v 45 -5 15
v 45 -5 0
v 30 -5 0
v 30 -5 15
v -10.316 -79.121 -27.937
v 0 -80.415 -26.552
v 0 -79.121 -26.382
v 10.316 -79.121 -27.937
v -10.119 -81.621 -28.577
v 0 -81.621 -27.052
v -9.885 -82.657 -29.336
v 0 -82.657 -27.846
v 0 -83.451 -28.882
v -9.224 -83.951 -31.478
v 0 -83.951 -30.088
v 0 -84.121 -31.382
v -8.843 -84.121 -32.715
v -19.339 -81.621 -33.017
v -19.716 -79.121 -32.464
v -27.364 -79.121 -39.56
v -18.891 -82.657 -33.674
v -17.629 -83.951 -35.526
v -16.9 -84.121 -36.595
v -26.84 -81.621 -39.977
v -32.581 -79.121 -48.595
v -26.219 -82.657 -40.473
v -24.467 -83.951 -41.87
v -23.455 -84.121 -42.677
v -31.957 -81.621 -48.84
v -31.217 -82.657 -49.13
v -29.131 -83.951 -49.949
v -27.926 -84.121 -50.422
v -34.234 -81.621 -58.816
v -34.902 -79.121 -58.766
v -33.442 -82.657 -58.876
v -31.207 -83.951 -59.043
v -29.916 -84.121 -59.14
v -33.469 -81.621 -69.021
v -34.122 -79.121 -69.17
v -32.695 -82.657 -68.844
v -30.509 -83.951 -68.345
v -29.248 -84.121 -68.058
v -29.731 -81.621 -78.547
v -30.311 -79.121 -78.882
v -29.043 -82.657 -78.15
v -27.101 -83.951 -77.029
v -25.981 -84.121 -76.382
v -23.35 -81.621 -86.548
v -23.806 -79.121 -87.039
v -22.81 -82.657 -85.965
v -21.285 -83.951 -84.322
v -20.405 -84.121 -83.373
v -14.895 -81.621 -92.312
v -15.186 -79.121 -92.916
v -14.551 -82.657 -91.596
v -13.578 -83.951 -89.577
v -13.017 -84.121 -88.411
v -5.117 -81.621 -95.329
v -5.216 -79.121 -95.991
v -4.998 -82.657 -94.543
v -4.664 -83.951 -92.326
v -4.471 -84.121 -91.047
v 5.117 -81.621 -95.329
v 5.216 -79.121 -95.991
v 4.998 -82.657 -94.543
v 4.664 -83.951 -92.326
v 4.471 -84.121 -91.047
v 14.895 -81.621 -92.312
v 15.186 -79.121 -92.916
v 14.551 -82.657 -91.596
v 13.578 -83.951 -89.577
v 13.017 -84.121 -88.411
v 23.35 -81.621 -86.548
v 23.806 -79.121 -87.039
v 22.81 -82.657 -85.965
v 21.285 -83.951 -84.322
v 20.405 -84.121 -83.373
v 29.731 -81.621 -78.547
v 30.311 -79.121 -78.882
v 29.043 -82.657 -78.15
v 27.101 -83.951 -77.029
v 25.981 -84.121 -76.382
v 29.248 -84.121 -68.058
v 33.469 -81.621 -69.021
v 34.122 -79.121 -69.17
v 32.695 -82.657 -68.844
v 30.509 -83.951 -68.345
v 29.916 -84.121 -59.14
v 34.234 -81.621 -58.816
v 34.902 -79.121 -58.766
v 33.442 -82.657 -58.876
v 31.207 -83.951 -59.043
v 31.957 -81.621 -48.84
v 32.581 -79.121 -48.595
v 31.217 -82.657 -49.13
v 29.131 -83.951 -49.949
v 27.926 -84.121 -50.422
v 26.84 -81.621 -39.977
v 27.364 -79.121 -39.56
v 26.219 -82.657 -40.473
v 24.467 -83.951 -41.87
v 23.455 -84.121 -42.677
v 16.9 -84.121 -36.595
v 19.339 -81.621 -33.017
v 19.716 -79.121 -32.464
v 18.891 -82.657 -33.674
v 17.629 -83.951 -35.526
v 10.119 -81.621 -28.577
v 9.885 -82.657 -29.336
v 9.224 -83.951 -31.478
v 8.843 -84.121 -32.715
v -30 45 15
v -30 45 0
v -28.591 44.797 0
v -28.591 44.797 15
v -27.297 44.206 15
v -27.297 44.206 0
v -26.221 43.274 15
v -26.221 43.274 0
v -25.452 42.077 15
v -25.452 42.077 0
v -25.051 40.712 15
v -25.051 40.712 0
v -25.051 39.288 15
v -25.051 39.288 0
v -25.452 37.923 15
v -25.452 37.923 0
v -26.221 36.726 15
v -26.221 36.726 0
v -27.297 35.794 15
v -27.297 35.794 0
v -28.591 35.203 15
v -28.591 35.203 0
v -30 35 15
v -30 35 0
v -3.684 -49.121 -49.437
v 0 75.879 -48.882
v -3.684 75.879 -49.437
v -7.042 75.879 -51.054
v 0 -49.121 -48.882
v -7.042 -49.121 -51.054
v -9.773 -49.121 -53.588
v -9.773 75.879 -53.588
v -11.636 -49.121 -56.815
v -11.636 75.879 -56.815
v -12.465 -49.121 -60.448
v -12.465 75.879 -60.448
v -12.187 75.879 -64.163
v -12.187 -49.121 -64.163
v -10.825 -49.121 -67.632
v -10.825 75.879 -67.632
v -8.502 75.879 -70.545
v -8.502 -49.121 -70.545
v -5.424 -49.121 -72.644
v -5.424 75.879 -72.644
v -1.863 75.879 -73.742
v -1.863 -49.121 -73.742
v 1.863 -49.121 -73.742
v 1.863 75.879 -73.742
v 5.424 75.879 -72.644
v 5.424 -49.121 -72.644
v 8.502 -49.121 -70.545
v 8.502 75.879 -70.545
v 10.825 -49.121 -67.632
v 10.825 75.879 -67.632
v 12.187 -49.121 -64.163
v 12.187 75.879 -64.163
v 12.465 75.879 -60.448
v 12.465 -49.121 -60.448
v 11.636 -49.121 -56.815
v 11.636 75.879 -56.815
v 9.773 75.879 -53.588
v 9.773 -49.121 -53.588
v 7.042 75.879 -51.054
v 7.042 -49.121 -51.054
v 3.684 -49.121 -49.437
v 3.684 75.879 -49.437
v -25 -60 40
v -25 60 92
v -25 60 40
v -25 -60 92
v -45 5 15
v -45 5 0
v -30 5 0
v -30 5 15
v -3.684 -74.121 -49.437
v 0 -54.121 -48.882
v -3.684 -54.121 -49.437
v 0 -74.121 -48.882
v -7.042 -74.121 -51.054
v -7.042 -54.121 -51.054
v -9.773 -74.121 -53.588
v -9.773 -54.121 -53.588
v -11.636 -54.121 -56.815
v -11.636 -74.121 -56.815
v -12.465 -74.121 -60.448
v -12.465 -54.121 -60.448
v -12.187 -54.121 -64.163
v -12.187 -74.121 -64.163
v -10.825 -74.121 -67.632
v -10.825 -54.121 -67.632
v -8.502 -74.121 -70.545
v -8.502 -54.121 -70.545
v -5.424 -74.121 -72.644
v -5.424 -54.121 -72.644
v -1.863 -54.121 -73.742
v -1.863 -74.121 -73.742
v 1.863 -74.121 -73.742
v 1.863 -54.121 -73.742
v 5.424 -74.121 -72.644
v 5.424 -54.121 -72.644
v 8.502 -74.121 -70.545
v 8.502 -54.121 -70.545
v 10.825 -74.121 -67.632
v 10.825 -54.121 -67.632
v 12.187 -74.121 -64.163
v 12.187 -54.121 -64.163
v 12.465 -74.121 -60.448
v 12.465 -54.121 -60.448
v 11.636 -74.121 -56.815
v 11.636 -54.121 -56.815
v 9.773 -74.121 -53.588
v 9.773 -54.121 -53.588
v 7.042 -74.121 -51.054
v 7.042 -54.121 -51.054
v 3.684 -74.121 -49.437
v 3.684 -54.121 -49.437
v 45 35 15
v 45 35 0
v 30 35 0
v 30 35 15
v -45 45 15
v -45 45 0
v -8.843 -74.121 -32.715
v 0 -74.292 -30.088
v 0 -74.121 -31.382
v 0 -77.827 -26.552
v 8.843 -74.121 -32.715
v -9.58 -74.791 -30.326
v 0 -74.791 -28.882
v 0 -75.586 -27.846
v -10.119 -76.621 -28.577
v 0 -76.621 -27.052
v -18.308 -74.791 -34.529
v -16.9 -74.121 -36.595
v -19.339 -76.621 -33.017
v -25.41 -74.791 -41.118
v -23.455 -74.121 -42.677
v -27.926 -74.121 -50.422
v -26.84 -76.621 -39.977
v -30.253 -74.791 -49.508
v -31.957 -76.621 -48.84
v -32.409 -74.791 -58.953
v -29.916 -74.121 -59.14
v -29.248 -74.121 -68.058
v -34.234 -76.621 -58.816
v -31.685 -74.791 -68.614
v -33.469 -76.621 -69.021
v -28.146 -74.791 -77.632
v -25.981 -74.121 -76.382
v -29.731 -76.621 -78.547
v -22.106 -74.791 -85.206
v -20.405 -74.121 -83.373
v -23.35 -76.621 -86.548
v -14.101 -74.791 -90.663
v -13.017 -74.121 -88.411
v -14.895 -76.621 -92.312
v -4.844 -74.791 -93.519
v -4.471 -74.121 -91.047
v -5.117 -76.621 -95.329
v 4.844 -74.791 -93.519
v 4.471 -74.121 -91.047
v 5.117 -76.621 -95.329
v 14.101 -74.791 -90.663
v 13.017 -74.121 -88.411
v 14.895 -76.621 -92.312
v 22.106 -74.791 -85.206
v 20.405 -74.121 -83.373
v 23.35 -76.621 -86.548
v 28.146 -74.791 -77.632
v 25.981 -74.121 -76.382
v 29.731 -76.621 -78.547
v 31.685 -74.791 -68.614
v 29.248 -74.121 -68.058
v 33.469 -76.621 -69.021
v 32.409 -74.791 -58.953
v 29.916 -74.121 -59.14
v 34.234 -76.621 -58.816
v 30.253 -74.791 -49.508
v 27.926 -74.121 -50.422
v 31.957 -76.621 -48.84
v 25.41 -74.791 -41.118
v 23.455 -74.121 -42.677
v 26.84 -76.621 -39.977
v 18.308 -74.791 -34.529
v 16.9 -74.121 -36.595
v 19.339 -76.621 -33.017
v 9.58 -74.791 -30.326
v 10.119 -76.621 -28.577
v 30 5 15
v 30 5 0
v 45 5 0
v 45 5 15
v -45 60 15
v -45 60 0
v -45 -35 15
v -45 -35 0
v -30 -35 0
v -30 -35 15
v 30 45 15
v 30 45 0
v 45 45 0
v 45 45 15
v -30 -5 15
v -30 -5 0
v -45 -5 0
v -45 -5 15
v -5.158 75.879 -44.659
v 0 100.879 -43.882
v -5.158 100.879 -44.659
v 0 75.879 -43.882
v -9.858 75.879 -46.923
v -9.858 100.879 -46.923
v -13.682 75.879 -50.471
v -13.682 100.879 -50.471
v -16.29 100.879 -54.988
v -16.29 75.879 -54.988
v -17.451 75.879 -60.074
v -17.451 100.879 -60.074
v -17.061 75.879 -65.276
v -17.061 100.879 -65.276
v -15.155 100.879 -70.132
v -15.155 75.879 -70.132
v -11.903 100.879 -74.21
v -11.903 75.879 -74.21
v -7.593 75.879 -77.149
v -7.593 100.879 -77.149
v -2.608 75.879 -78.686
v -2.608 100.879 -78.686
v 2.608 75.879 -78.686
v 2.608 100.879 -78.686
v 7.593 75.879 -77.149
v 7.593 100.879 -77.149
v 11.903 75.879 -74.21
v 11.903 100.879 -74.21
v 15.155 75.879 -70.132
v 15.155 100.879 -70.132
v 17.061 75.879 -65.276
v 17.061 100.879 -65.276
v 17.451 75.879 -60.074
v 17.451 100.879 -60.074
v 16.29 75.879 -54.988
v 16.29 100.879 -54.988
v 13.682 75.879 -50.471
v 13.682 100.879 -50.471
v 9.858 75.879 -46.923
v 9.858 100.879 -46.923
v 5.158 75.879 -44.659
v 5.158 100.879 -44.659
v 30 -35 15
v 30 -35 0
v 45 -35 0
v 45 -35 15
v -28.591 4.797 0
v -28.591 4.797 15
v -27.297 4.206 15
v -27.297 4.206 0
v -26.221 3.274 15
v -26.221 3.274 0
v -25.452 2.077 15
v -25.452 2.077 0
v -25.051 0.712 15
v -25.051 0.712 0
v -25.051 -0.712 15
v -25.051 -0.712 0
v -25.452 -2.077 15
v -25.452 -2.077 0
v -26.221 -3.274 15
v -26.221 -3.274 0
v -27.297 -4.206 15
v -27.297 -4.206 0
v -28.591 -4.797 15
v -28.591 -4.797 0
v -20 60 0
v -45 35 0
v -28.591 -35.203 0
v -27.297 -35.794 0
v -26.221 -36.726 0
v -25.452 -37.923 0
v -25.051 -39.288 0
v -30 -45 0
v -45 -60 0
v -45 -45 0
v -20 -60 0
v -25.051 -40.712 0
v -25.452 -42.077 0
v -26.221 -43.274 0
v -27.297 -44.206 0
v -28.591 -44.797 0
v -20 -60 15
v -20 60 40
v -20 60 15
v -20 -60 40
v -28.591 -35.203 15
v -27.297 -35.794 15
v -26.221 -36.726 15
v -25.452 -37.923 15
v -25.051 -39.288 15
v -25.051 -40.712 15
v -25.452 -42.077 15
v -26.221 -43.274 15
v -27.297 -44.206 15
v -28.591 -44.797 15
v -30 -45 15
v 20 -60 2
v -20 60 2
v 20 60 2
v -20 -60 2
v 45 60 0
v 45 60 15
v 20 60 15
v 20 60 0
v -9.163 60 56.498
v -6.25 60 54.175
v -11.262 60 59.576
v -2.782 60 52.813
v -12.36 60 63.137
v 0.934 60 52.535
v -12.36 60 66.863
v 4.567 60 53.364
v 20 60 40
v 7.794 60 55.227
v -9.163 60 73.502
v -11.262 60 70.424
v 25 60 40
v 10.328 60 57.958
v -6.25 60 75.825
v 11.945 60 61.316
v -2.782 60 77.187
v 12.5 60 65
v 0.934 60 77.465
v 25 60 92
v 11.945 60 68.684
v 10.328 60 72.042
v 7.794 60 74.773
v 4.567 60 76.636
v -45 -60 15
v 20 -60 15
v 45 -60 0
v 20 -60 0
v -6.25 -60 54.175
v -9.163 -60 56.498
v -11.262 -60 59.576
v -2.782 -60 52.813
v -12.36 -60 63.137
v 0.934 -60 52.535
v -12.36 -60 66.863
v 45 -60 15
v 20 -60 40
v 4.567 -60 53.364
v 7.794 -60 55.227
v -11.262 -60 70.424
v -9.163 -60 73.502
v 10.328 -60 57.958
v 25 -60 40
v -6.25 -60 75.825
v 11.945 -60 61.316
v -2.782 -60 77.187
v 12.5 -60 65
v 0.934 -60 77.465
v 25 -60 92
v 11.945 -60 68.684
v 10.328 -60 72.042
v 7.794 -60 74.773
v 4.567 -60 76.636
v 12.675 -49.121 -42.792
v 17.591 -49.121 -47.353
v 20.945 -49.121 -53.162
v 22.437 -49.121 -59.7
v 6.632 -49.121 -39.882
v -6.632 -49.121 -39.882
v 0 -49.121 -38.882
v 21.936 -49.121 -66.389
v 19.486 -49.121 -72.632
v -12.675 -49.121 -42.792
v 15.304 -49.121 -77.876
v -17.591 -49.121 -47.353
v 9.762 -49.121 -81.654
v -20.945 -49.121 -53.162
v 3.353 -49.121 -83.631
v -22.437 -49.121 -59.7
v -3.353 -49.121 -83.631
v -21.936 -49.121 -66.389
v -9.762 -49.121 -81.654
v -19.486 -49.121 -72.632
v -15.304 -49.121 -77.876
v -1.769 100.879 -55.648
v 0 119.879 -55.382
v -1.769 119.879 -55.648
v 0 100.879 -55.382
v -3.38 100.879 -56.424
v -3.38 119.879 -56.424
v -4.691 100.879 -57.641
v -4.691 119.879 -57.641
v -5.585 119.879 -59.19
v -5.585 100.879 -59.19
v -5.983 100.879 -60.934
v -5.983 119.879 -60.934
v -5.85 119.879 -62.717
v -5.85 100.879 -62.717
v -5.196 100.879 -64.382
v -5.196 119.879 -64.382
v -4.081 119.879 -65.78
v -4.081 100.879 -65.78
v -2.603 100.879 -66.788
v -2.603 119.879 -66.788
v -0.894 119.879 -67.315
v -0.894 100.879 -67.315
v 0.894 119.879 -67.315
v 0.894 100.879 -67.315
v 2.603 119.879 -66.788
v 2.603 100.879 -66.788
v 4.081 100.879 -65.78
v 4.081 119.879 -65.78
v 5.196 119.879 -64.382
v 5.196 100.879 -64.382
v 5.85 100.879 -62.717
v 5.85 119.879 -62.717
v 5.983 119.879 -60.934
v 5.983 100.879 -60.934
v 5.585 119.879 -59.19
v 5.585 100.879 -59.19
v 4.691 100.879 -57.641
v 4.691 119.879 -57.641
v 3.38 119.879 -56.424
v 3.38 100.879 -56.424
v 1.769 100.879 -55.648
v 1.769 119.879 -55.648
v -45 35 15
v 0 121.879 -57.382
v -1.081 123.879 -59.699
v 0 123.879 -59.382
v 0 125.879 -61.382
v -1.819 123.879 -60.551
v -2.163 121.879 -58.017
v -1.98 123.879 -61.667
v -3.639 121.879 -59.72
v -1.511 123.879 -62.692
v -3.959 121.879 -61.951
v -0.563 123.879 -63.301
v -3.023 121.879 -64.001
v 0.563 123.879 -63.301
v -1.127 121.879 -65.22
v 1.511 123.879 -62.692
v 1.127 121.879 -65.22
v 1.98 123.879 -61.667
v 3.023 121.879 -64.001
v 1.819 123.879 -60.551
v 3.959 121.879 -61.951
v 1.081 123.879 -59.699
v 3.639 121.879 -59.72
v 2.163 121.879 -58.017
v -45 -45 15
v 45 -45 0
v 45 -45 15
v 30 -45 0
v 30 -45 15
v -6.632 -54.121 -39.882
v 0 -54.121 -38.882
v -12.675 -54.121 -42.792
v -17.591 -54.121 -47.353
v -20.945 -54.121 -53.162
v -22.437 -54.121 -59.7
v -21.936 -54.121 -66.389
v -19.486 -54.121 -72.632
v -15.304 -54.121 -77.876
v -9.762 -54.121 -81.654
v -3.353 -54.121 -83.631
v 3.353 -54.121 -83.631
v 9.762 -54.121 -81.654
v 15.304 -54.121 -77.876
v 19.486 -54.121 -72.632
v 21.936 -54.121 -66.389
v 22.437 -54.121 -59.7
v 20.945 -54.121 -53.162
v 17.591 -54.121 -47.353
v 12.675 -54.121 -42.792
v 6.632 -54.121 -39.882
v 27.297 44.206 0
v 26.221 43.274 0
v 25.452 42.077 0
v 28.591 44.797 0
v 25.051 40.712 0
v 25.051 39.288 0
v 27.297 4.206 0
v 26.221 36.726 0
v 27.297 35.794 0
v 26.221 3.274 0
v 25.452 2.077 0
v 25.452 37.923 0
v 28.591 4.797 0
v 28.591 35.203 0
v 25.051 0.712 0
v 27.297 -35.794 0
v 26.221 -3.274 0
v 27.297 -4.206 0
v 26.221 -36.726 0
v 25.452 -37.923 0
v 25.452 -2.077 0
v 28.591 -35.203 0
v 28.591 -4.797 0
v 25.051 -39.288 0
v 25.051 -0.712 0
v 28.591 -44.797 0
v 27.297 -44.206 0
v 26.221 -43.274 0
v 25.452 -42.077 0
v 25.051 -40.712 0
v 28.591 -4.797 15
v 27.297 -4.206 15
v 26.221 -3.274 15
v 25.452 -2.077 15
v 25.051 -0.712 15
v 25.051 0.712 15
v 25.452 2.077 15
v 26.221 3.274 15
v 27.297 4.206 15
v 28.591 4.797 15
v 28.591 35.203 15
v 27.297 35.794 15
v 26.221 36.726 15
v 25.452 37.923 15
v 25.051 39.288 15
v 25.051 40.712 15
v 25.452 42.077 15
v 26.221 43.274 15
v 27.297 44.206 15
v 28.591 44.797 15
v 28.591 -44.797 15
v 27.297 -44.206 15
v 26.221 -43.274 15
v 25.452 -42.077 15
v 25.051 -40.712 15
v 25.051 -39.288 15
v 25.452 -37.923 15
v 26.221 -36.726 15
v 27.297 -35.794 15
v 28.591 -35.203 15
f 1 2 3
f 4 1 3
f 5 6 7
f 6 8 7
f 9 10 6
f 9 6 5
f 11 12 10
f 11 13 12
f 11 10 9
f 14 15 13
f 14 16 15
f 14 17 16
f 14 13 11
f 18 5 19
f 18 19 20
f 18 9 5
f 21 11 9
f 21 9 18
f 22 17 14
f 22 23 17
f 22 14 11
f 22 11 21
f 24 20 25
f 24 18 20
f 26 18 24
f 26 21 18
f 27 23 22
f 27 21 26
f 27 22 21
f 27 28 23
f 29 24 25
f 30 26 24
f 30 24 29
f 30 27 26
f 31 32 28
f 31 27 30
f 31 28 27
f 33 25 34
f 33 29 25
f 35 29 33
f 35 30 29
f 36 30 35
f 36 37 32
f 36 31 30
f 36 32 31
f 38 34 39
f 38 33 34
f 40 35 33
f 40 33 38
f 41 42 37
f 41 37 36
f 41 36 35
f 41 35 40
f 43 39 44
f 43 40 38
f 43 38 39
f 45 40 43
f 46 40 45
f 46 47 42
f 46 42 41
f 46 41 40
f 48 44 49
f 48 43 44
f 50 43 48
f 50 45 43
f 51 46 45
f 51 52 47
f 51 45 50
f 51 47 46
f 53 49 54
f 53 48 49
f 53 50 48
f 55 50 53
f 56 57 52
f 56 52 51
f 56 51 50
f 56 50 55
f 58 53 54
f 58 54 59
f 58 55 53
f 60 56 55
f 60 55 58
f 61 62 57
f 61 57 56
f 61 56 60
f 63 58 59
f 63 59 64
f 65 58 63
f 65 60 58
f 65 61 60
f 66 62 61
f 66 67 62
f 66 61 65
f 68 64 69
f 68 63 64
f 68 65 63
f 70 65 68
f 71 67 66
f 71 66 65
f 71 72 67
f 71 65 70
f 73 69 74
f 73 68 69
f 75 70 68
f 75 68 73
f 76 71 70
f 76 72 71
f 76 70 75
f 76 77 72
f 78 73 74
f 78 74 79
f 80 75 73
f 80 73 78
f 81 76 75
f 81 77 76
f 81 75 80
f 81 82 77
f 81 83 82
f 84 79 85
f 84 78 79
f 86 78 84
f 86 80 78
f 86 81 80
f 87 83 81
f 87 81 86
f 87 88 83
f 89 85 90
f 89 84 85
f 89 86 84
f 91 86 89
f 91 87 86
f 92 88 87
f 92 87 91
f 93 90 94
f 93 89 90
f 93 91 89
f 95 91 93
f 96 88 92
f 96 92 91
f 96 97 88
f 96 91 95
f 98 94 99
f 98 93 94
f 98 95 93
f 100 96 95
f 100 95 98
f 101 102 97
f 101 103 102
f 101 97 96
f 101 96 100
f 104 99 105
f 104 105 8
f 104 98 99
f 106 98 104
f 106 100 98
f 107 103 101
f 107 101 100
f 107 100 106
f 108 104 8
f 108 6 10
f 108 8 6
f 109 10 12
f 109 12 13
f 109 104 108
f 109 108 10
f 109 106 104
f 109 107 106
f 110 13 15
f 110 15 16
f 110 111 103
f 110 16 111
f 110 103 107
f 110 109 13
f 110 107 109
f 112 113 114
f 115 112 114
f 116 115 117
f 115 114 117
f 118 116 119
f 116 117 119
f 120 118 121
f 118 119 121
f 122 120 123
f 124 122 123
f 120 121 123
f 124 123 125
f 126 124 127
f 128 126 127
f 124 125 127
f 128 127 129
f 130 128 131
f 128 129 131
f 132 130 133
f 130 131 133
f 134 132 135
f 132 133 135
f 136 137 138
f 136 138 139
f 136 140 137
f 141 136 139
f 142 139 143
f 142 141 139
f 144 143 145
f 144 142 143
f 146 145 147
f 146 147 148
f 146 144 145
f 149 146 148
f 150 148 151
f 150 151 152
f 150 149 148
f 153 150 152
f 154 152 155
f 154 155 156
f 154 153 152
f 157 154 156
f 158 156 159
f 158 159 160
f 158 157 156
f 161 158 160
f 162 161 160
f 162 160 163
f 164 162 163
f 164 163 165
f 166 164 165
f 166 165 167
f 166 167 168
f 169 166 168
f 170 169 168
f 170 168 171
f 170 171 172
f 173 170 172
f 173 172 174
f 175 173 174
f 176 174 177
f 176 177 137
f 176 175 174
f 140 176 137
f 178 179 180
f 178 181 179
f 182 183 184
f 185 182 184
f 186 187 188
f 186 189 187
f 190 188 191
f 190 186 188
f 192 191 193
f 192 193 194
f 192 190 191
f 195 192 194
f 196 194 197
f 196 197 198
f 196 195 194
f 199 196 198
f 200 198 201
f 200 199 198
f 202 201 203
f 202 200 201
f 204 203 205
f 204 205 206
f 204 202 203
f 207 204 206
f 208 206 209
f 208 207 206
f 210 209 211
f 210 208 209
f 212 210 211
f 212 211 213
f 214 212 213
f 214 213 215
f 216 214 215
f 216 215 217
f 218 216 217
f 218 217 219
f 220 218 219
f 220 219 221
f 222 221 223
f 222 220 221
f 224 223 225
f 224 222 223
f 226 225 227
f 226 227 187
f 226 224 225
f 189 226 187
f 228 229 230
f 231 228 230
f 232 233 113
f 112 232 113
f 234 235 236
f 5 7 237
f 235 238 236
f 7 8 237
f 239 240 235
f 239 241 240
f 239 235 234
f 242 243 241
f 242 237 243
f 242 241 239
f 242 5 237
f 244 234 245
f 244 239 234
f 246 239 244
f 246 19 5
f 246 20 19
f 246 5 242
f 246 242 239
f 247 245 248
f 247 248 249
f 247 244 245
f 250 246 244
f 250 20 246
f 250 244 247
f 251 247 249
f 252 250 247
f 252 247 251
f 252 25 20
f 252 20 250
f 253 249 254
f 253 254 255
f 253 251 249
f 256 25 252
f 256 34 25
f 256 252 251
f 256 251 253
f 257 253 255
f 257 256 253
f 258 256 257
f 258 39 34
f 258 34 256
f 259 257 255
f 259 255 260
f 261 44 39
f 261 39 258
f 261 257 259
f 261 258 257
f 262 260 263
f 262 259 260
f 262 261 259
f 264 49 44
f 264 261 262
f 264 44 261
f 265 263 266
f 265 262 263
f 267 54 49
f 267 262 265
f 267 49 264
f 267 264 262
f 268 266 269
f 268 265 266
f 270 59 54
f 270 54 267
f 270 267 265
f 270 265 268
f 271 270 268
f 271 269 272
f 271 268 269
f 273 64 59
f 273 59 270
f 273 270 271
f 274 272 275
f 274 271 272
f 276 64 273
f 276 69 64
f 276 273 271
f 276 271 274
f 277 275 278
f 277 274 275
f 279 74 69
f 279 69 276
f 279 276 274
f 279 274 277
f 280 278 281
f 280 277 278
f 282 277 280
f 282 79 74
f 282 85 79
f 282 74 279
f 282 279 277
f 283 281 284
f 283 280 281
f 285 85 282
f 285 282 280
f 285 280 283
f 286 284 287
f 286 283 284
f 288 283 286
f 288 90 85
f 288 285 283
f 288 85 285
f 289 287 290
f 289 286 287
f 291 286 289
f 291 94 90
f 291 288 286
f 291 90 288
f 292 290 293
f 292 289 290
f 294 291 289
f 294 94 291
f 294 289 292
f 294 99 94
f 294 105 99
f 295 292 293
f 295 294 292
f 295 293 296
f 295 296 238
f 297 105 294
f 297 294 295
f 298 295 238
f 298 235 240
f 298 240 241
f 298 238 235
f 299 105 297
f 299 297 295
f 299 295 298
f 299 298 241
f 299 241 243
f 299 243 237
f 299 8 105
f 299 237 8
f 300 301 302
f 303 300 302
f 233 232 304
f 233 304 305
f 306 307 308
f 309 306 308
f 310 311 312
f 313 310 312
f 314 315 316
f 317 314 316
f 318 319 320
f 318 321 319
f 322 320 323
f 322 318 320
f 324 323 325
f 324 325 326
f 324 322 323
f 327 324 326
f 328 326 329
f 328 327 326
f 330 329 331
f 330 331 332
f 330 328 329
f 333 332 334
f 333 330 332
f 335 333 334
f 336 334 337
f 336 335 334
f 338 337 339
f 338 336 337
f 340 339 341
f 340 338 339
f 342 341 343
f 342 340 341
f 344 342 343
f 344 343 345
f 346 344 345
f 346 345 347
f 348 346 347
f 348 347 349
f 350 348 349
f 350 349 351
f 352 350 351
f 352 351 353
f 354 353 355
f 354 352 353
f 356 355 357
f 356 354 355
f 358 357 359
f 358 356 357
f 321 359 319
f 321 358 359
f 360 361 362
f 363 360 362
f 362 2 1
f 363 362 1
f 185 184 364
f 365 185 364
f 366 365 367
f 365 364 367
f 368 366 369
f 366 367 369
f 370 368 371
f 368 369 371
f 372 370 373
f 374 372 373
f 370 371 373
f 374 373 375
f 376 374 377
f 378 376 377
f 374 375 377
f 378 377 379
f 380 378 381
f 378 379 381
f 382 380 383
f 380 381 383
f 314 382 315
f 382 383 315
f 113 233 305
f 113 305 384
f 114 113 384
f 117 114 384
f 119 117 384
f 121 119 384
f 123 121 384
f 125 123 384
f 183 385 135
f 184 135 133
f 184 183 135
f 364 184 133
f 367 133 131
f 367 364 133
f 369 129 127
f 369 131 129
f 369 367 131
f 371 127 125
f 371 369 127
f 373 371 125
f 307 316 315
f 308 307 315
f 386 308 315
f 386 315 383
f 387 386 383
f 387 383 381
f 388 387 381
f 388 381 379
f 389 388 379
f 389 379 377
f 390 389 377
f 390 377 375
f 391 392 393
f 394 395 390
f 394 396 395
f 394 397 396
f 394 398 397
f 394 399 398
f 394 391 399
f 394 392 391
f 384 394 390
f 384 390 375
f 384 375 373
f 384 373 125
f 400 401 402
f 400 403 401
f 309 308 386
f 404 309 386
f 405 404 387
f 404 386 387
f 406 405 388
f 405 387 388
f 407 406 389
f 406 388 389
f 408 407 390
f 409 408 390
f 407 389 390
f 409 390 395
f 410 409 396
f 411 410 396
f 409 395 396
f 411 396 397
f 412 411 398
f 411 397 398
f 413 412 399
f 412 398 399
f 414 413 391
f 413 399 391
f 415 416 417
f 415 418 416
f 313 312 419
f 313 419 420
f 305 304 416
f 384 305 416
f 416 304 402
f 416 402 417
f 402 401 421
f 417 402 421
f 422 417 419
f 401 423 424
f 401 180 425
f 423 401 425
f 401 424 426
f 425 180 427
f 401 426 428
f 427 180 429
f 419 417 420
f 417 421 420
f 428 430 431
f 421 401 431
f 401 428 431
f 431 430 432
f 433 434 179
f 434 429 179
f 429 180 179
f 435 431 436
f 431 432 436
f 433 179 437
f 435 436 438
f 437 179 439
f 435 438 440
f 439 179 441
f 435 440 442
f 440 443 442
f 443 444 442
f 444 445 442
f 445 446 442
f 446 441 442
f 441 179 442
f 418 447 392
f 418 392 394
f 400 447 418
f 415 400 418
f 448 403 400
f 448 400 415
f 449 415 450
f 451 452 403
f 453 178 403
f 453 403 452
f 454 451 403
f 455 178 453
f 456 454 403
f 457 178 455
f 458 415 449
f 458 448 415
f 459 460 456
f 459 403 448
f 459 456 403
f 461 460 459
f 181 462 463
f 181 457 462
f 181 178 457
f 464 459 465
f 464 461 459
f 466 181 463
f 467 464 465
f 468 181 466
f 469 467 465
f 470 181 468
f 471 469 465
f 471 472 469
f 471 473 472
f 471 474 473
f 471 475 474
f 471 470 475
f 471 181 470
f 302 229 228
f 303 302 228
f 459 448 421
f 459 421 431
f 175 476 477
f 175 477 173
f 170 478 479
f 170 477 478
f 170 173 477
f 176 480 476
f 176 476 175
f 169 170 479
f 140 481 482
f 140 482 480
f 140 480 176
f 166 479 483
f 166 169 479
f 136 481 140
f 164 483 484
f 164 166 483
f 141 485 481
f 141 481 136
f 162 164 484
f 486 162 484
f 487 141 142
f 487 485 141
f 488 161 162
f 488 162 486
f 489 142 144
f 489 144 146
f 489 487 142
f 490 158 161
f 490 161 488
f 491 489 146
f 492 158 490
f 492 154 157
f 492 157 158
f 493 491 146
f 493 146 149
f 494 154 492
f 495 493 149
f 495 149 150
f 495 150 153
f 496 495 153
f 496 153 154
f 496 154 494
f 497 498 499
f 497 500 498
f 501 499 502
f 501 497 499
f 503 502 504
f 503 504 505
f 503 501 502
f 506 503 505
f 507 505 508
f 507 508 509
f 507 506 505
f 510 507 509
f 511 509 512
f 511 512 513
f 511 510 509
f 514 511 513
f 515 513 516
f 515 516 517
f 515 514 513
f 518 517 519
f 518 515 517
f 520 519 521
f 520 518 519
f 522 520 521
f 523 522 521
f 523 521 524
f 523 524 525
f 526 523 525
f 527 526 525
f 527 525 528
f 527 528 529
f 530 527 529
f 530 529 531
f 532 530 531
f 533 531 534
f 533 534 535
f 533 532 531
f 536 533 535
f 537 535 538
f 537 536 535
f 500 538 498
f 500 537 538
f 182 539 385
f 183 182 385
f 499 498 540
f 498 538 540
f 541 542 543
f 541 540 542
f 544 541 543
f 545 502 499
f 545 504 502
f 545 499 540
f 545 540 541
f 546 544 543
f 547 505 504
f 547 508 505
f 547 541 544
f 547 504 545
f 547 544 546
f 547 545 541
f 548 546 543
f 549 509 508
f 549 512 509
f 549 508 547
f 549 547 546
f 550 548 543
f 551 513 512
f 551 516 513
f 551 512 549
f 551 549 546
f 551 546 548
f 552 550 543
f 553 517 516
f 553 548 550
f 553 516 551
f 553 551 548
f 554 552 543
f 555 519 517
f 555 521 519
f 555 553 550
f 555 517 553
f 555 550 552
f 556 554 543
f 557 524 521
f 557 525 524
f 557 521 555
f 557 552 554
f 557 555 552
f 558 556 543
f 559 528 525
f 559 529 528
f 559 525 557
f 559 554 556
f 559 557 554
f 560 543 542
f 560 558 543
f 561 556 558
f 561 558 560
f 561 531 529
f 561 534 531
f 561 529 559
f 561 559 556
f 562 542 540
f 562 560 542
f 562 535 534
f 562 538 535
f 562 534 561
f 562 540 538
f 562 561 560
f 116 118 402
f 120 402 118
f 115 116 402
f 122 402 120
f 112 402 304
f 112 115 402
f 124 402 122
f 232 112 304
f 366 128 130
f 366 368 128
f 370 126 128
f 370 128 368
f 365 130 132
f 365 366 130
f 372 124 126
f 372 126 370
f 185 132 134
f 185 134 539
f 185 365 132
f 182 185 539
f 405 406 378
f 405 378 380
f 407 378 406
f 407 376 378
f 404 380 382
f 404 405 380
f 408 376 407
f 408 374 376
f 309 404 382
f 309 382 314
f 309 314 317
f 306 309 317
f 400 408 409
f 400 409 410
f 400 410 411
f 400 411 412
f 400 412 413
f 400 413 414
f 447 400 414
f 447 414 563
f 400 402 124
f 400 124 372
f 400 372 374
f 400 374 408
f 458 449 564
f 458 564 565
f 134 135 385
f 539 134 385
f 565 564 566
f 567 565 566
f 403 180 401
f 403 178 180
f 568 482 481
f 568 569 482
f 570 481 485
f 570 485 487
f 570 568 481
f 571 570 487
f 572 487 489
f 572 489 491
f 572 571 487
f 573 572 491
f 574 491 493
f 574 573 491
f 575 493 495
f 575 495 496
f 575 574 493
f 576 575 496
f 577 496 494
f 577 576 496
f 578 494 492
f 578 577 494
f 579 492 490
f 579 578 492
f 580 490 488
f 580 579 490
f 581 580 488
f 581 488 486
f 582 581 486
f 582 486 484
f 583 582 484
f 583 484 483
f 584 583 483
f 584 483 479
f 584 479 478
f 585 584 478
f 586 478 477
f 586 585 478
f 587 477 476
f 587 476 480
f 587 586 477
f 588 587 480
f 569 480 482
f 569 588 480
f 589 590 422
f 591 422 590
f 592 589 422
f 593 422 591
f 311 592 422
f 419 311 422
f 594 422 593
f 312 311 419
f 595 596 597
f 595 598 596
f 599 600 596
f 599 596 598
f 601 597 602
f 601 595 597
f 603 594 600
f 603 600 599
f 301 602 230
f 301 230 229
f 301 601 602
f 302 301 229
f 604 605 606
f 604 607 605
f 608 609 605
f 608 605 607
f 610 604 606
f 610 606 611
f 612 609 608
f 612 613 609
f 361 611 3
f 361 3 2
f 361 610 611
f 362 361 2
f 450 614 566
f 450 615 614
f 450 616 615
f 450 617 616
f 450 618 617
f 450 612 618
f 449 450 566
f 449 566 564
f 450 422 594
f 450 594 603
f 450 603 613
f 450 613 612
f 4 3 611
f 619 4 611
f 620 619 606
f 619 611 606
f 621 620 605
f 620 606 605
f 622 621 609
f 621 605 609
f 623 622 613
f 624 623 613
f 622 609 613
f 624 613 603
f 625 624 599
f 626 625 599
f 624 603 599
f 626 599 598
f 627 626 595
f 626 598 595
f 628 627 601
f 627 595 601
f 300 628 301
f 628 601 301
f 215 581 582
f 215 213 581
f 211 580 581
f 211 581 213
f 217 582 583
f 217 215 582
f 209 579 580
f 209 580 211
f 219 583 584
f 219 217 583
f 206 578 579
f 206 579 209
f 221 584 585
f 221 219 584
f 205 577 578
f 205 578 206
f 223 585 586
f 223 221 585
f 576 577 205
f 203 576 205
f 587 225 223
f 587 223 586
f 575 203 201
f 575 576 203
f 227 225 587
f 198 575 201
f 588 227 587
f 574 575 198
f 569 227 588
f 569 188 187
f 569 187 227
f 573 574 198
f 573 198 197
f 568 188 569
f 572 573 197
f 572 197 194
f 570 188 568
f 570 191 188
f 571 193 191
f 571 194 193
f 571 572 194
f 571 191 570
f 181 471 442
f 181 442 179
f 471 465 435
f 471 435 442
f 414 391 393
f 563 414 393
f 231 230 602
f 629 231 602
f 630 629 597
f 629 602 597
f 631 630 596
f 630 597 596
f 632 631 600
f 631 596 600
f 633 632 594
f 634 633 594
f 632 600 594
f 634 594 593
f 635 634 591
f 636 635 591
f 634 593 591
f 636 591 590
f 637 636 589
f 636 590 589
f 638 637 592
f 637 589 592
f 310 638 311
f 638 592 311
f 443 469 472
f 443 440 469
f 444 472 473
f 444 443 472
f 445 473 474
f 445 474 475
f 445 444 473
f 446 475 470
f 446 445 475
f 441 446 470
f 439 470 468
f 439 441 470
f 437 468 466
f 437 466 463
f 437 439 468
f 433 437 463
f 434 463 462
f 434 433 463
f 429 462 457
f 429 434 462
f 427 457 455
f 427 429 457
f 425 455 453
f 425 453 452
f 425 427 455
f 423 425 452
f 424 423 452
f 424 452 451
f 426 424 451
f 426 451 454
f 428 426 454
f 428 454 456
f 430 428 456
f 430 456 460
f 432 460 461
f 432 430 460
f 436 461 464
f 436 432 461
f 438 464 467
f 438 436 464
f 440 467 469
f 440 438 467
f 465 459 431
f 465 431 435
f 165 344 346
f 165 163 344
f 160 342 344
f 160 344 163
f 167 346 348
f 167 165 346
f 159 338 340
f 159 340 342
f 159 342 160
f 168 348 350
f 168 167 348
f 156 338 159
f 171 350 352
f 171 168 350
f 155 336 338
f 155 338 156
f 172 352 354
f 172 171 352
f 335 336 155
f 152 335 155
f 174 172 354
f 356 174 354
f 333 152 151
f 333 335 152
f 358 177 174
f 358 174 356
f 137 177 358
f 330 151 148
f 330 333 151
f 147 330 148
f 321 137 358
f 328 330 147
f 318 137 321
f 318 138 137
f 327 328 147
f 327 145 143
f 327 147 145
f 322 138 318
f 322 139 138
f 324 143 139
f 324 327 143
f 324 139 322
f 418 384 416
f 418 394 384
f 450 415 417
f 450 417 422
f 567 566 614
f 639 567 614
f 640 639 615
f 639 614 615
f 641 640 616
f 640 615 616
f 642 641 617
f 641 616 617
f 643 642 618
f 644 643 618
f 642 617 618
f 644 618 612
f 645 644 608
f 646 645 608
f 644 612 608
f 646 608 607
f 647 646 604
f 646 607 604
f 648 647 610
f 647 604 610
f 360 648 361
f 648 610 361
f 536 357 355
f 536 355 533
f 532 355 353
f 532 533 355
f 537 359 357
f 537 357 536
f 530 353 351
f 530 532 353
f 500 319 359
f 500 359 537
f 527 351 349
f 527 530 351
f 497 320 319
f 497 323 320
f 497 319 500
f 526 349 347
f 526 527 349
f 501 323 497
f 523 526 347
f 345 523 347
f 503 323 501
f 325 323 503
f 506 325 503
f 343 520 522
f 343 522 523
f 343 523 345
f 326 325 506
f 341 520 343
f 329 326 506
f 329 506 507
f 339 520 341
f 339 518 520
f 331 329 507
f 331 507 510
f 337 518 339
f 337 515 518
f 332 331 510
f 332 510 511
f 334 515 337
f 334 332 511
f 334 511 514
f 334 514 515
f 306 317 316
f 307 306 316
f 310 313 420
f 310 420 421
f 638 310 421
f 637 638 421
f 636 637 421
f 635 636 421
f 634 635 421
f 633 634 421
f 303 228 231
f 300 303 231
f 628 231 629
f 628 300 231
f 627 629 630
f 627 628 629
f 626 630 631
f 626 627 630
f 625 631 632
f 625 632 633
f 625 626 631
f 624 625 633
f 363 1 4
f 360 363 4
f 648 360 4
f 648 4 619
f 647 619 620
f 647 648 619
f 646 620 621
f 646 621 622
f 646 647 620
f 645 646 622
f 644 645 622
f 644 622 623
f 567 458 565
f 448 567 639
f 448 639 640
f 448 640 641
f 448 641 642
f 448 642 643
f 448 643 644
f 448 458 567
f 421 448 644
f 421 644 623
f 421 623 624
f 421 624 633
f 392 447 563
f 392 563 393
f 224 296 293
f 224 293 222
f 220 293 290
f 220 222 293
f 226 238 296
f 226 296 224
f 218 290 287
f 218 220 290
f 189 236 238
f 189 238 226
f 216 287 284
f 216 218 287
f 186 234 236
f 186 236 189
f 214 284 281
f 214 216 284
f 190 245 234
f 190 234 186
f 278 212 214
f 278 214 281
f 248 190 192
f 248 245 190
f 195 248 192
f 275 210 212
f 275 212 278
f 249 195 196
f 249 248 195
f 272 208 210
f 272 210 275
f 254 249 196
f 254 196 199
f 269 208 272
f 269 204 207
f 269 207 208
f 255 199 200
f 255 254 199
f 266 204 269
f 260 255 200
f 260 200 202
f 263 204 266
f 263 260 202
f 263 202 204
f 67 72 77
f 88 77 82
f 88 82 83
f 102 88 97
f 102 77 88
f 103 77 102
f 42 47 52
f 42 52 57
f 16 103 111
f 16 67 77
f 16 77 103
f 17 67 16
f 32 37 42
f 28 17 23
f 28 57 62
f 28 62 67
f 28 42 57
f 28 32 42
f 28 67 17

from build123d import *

# Parameters (mm, degrees)
F0_R     = 12.5
F1_DEPTH = 60
F3_DEPTH = 25
F6_R     = 4.99999


# Not quite as in the source:
# - a fillet or chamfer is up to 0.001 mm smaller than in the source, because OpenCascade refuses the exact size


with BuildPart() as f1:
    # F0 (on Front) → F1 (new body, symmetric)
    with BuildSketch(Plane.XZ):
        Polygon((-20, 2), (0, 2), (20, 2), (20, 0), (45, 0), (45, 15), (20, 15), (20, 40), (25, 40), (25, 92), (-25, 92), (-25, 40), (-20, 40), (-20, 15), (-45, 15), (-45, 0), (-20, 0), align=None)
        with Locations((0, 65)):
            Circle(F0_R, mode=Mode.SUBTRACT)
    extrude(amount=F1_DEPTH, both=True)

    # F2 (on face) → F3 (cut)
    with BuildSketch(Plane(origin=(0, 0, 0), x_dir=(1, 0, 0), z_dir=(0, 0, -1))):
        with BuildLine():
            ThreePointArc((-30, 35), (-25, 40), (-30, 45))
            Line((-30, 45), (-50, 45))
            ThreePointArc((-50, 45), (-55, 40), (-50, 35))
            Line((-50, 35), (-30, 35))
        make_face()
        with BuildLine():
            ThreePointArc((-30, -5), (-25, 0), (-30, 5))
            Line((-30, 5), (-50, 5))
            ThreePointArc((-50, 5), (-55, 0), (-50, -5))
            Line((-50, -5), (-30, -5))
        make_face()
        with BuildLine():
            ThreePointArc((-30, -45), (-25, -40), (-30, -35))
            Line((-30, -35), (-50, -35))
            ThreePointArc((-50, -35), (-55, -40), (-50, -45))
            Line((-50, -45), (-30, -45))
        make_face()
        with BuildLine():
            Line((50, 45), (30, 45))
            ThreePointArc((30, 45), (25, 40), (30, 35))
            Line((30, 35), (50, 35))
            ThreePointArc((50, 35), (55, 40), (50, 45))
        make_face()
        with BuildLine():
            Line((50, 5), (30, 5))
            ThreePointArc((30, 5), (25, 0), (30, -5))
            Line((30, -5), (50, -5))
            ThreePointArc((50, -5), (55, 0), (50, 5))
        make_face()
        with BuildLine():
            Line((50, -35), (30, -35))
            ThreePointArc((30, -35), (25, -40), (30, -45))
            Line((30, -45), (50, -45))
            ThreePointArc((50, -45), (55, -40), (50, -35))
        make_face()
    extrude(amount=-F3_DEPTH, mode=Mode.SUBTRACT)


with BuildPart() as f5:
    # F4 (on Right) → F5 (revolve)
    with BuildSketch(Plane.YZ):
        Polygon((-84.121281445, -61.381906271), (125.878718555, -61.381906271), (119.878718555, -55.381906271), (100.878718555, -55.381906271), (100.878718555, -43.881906271), (75.878718555, -43.881906271), (75.878718555, -48.881906271), (-49.121281445, -48.881906271), (-49.121281445, -38.881906271), (-54.121281445, -38.881906271), (-54.121281445, -48.881906271), (-74.121281445, -48.881906271), (-74.121281445, -26.381906271), (-84.121281445, -26.381906271), align=None)
    revolve(axis=Axis((0, 20.878718555, -61.381906271), (0, -1, 0)))

    # F6 (radius 5 in the source; OpenCascade refuses exactly that, so slightly less here)
    f6_edges = [f5.edges().sort_by_distance(p)[0] for p in [
        (0, -74.121281, -96.381906),
        (0, -84.121281, -96.381906),
    ]]
    fillet(f6_edges, radius=F6_R)


solid = Compound([f1.part, f5.part])
